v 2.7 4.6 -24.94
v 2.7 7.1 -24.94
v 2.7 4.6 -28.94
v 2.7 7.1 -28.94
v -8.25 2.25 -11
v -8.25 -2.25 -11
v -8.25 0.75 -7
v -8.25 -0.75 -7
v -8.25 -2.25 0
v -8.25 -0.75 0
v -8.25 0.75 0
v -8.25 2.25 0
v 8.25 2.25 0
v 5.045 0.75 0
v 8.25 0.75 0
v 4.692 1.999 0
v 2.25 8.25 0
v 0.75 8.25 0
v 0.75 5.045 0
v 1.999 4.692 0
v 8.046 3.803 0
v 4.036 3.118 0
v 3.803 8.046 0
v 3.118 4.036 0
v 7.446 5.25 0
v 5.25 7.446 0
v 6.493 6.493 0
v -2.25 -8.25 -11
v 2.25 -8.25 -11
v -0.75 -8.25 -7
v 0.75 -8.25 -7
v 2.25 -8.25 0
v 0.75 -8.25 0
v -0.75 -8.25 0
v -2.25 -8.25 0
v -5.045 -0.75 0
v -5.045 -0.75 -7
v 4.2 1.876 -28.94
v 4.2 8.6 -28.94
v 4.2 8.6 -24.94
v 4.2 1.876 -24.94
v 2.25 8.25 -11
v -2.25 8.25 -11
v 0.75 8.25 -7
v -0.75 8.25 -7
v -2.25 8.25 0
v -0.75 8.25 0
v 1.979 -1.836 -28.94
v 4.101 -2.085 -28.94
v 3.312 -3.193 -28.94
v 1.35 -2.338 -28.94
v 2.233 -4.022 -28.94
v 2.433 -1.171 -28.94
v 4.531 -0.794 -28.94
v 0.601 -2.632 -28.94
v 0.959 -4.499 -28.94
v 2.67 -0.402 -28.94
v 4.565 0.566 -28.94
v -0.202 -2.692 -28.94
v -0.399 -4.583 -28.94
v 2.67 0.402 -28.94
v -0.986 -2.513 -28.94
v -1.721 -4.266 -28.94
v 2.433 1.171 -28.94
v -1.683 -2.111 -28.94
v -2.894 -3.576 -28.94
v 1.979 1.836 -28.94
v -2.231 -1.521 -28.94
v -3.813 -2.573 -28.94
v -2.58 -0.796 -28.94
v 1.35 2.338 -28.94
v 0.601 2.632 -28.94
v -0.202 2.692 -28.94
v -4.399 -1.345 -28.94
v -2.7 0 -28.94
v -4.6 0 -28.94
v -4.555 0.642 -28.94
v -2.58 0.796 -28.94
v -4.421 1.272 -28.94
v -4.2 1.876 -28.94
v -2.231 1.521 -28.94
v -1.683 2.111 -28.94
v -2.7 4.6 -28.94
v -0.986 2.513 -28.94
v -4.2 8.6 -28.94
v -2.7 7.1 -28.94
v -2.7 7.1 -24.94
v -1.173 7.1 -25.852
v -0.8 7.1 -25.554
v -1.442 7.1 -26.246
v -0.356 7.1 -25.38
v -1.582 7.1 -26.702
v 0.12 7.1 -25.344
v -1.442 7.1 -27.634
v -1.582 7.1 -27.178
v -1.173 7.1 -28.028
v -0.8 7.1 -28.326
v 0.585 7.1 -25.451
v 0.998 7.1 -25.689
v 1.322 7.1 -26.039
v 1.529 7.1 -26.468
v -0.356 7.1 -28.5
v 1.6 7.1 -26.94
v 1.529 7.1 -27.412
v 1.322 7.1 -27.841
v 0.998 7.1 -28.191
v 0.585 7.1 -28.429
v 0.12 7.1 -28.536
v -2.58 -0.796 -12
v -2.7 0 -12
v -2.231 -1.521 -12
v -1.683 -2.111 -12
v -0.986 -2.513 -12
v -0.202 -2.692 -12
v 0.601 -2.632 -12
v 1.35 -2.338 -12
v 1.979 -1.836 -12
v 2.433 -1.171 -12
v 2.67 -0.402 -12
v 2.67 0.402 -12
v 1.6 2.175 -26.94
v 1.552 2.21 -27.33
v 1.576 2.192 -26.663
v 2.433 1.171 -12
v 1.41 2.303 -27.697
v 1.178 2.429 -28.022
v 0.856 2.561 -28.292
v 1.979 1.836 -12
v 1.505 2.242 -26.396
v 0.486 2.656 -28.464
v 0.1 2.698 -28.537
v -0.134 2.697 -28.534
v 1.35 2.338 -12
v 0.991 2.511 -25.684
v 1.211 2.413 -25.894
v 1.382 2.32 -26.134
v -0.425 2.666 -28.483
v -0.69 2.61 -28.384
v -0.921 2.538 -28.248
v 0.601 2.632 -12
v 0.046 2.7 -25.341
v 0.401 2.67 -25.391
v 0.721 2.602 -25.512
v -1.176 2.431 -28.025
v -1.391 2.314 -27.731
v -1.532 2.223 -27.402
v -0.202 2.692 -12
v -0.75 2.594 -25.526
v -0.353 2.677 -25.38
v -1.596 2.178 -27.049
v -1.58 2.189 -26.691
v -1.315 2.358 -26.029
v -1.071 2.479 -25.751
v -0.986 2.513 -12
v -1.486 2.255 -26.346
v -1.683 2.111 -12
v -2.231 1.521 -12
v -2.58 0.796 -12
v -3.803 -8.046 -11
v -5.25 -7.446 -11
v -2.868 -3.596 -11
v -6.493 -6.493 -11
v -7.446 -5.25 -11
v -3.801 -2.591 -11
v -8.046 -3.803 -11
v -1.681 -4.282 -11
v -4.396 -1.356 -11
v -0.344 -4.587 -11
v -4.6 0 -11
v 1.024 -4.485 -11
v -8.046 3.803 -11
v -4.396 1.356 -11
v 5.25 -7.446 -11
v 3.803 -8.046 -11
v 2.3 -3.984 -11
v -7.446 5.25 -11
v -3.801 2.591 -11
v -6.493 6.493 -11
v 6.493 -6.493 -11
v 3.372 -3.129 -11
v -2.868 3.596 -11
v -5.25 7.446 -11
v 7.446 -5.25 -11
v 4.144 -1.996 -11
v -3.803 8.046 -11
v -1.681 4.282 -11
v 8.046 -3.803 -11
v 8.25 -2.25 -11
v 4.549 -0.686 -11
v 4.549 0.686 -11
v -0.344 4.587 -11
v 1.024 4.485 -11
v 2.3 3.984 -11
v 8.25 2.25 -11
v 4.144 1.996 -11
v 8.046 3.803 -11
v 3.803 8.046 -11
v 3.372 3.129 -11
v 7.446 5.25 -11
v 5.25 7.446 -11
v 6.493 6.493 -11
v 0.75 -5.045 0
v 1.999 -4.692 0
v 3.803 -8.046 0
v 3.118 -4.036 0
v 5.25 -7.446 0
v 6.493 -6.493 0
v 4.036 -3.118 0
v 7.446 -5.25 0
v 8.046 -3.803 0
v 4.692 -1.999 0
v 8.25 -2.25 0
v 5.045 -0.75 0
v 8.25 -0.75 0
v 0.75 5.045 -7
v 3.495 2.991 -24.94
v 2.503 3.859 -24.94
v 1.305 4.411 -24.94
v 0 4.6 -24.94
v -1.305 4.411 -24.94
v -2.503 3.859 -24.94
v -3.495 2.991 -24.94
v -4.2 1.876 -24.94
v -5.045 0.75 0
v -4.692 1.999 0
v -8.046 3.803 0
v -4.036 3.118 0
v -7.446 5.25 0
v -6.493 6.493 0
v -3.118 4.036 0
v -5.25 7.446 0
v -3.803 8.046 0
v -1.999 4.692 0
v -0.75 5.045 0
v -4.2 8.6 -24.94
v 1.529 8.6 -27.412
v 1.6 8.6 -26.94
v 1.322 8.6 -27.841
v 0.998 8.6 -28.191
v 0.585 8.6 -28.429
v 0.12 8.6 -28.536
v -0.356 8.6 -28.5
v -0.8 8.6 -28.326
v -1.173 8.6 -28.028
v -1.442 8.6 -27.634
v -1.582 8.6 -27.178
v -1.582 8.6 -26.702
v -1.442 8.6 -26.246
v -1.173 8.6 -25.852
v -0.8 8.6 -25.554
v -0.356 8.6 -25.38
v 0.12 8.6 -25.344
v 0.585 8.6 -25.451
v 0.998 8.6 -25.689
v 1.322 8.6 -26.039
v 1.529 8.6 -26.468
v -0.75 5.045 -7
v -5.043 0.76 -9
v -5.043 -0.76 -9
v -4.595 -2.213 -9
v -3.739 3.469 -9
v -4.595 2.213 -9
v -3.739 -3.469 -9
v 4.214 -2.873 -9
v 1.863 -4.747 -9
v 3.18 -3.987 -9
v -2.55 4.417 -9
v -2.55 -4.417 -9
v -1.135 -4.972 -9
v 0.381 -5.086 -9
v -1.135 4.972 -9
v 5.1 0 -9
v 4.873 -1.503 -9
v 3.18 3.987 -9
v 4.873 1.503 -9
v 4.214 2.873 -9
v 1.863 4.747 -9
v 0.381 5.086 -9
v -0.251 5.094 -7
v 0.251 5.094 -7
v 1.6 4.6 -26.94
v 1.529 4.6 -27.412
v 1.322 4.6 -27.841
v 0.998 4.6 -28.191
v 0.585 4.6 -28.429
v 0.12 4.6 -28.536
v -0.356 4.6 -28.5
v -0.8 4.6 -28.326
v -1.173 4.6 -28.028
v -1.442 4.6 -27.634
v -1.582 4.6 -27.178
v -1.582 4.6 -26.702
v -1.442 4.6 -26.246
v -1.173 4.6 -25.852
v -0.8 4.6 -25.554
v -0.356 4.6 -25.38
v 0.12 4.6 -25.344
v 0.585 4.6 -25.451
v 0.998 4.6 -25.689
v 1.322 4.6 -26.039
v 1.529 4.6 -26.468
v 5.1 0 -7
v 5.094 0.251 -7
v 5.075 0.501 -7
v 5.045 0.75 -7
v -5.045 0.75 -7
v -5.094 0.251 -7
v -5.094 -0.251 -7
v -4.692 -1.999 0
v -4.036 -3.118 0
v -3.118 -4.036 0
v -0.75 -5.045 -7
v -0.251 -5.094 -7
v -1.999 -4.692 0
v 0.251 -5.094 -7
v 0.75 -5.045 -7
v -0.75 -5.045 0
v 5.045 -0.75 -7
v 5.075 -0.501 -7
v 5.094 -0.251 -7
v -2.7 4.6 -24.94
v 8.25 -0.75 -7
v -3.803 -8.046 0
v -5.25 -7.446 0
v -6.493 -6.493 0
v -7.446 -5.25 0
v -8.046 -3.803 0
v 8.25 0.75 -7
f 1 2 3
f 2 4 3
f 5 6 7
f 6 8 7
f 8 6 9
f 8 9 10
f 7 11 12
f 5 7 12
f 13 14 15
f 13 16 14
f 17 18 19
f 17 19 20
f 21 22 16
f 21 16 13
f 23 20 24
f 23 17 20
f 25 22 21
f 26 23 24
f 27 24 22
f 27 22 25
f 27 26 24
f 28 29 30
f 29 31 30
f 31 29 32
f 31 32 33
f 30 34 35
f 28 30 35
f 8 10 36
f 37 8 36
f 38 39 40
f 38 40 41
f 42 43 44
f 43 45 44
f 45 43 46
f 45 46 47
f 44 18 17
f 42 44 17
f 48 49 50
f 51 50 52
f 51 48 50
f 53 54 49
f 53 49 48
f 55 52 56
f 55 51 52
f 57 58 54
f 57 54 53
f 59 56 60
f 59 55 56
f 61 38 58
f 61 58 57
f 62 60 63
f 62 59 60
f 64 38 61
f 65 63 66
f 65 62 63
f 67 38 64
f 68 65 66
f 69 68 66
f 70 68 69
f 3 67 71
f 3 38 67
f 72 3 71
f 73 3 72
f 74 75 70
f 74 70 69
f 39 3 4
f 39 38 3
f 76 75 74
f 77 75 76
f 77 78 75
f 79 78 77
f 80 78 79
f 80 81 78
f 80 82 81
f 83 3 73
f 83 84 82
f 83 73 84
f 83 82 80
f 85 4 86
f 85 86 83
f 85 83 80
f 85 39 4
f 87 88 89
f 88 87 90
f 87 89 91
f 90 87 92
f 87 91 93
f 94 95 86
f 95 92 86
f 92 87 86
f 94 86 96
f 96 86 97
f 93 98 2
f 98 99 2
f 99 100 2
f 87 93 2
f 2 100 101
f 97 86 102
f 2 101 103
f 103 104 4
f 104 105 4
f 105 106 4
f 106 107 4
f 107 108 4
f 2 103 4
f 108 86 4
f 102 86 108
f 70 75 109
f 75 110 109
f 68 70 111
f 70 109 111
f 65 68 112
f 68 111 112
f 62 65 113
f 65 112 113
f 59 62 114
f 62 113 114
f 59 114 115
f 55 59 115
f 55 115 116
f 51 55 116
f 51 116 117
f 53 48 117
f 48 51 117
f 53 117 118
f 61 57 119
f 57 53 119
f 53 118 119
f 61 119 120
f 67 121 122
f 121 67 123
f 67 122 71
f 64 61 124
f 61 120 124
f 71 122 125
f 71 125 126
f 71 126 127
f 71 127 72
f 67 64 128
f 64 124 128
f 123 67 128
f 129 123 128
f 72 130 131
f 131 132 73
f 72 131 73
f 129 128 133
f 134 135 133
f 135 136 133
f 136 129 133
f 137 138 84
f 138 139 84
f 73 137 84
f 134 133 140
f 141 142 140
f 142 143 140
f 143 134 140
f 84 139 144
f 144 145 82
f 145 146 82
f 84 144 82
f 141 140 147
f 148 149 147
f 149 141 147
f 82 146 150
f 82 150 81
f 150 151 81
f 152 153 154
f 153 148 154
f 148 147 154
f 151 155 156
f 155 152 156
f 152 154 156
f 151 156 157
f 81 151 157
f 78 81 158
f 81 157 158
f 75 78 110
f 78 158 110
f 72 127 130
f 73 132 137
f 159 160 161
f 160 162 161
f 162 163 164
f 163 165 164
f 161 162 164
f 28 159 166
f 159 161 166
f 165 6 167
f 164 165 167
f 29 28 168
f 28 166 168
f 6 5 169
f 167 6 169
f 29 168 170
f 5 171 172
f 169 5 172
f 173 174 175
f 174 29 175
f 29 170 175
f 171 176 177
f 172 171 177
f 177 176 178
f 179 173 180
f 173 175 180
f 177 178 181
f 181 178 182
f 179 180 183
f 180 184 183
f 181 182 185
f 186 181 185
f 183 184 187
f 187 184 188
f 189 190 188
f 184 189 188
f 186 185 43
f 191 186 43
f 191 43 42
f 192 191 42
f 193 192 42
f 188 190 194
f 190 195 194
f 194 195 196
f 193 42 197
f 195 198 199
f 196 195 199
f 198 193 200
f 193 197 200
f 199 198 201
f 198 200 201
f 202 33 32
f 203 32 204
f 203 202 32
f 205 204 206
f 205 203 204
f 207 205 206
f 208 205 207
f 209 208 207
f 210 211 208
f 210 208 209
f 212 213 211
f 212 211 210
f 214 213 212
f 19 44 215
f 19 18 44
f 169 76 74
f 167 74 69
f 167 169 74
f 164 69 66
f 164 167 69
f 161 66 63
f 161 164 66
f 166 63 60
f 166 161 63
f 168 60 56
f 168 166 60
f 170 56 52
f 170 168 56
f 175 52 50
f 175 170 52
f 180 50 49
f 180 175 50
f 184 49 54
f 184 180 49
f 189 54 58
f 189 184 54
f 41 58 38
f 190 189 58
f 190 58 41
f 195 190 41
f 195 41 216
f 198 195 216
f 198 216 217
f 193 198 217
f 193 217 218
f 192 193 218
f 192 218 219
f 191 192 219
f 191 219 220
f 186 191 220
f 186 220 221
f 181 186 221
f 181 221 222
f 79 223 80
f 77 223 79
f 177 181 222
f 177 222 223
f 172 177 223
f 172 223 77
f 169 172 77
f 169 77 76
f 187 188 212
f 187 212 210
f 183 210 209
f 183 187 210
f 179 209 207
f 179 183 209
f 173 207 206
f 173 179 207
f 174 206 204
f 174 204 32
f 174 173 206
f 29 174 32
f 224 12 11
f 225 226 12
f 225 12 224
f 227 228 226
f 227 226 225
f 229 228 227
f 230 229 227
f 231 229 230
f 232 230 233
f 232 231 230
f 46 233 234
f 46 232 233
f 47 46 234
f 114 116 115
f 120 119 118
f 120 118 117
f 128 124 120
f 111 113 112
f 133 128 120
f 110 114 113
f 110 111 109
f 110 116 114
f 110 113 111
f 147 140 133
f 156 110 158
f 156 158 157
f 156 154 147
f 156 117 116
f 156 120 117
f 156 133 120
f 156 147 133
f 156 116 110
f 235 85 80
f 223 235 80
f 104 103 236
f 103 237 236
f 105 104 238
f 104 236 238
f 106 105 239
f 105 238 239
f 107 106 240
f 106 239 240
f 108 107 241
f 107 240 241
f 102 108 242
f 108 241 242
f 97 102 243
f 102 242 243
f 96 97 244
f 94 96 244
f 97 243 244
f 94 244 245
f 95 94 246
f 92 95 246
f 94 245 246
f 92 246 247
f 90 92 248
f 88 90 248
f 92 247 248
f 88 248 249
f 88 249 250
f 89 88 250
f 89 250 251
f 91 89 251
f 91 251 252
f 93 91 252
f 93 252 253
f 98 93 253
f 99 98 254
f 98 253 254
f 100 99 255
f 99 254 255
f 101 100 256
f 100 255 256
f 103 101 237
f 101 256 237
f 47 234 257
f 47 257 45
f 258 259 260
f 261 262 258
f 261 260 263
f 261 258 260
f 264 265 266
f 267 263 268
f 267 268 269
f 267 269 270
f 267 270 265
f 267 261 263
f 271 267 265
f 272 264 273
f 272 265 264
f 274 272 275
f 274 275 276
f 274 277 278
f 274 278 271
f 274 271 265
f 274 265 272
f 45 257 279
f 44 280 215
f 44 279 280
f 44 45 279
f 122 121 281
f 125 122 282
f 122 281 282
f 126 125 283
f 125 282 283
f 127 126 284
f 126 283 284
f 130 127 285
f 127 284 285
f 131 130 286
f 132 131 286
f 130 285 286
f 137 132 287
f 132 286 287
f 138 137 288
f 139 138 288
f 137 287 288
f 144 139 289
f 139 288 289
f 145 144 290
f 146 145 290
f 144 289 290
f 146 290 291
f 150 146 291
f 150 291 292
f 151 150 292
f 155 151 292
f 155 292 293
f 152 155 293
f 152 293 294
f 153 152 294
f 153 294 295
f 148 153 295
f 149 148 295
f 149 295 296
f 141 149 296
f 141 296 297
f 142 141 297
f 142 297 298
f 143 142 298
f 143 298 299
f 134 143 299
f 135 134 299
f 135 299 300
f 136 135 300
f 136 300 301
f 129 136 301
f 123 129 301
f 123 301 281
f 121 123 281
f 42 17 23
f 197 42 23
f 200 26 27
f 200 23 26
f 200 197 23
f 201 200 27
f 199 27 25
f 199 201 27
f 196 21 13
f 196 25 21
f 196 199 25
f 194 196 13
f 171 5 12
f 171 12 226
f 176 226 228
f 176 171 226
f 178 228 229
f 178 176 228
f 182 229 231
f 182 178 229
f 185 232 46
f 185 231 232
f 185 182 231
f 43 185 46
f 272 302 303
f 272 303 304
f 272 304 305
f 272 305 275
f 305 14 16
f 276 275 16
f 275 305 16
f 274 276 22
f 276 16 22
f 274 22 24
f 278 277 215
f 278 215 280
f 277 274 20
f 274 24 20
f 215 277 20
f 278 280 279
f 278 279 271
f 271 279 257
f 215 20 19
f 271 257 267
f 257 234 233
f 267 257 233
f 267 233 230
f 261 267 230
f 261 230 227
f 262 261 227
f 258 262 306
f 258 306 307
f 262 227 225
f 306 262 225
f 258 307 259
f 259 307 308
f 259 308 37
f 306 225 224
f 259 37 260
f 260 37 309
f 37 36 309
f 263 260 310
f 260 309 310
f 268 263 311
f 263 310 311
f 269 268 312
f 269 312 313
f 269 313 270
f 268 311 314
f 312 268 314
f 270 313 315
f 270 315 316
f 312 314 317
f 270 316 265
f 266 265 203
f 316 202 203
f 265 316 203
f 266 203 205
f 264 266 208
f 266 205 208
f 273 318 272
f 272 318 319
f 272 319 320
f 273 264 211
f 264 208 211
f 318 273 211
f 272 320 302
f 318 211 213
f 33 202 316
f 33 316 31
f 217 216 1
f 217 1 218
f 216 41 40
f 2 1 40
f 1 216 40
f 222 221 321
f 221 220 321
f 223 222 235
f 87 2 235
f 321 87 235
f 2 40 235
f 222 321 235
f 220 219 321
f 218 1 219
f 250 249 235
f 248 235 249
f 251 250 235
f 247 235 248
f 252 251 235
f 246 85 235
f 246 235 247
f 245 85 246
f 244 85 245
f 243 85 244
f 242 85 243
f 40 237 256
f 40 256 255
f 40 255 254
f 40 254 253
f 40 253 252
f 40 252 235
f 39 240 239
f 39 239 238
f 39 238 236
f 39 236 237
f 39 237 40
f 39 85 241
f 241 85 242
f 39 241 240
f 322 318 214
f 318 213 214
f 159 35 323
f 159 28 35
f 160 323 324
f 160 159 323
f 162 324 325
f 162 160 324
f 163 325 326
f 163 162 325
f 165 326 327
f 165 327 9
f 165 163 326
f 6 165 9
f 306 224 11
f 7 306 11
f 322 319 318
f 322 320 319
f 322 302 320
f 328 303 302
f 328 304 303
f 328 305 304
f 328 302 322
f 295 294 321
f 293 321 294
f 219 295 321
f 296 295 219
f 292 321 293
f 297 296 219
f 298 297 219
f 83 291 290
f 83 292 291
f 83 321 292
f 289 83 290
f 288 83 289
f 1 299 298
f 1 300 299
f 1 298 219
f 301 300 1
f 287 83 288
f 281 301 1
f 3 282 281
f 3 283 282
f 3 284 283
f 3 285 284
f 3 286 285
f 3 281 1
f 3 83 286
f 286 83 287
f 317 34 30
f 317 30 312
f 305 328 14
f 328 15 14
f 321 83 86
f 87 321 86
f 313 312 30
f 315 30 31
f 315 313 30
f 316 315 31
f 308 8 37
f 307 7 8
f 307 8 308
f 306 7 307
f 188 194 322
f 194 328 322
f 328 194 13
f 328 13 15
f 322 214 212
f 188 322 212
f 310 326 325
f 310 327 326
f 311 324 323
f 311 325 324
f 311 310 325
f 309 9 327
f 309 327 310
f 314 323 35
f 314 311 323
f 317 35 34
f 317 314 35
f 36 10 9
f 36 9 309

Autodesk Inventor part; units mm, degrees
ref_plane "YZ Plane" through (0, 0, 0) normal (1, 0, 0) x (0, 1, 0)
ref_plane "XY Plane" through (0, 0, 0) normal (0, 0, 1) x (1, 0, 0)
sketch "Sketch1" plane through (0, 0, 0) normal (0, 0, 1) x (1, 0, 0)
  circle A0 centre (0, 0) radius 5.1
  line L0 (-8.25, 8.25) -> (8.25, 8.25)
  line L1 (8.25, 8.25) -> (8.25, -8.25)
  line L2 (8.25, -8.25) -> (-8.25, -8.25)
  line L3 (-8.25, -8.25) -> (-8.25, 8.25)
  line L4 (-8.25, 8.25) -> (8.25, -8.25) construction
  line L5 (8.25, 8.25) -> (-8.25, -8.25) construction
  line L6 (0.75, -8.25) -> (-0.75, -8.25)
  line L7 (-0.75, -8.25) -> (-0.75, 8.25)
  line L8 (-0.75, 8.25) -> (0.75, 8.25)
  line L9 (0.75, 8.25) -> (0.75, -8.25)
  line L10 (0.75, -8.25) -> (-0.75, 8.25) construction
  line L11 (-0.75, -8.25) -> (0.75, 8.25) construction
  line L12 (8.25, 0.75) -> (-8.25, 0.75)
  line L13 (-8.25, 0.75) -> (-8.25, -0.75)
  line L14 (-8.25, -0.75) -> (8.25, -0.75)
  line L15 (8.25, -0.75) -> (8.25, 0.75)
  line L16 (8.25, 0.75) -> (-8.25, -0.75) construction
  line L17 (-8.25, 0.75) -> (8.25, -0.75) construction
  point P0 (0.75, -5.0446)
  point P1 (5.0446, -0.75)
  point P2 (5.0446, 0.75)
  point P3 (0.75, 5.0446)
  point P4 (-0.75, 5.0446)
  point P5 (-5.0446, 0.75)
  point P6 (-5.0446, -0.75)
  point P7 (-0.75, -5.0446)
  dimension "d0" = 10.2
  dimension "d1" = 16.5
  dimension "d2" = 1.5
  dimension "d3" = 1.5
  dimension "d38" = 16.5
extrude "Extrusion1" add sketch "Sketch1" against normal blind 11
extrude "Extrusion2" cut sketch "Sketch1" against normal blind 7 contours A0 L14 L9 L12 | A0 L12 L1 L14 | L12 L9 A0 | A0 L9 L14 | L9 L12 L7 A0 | A0 L7 L0 L9 | L9 L14 L7 L12 | L9 L2 L7 A0 | A0 L7 L14 L9 | L7 L12 A0 | L7 L14 A0 L12 | A0 L14 L7 | A0 L14 L3 L12
sketch "Sketch2" plane through (0, 0, -11) normal (0, 0, -1) x (-1, 0, 0)
  circle A0 centre (0, 0) radius 5
  dimension "d8" = 10
extrude "Extrusion3" [suppressed]
fillet "Fillet1" radius 6 4 edges at (8.25, 8.25, -5.5) (8.25, -8.25, -5.5) (-8.25, -8.25, -5.5) (-8.25, 8.25, -5.5)
sketch "Sketch3" plane through (0, 0, -26) normal (0, 0, -1) x (-1, 0, 0)
  line L0 (4, 2.7238) -> (10.2, 2.7238)
  line L1 (10.2, 2.7238) -> (10.2, -2.0551)
  line L2 (10.2, -2.0551) -> (4, -2.0551)
  line L3 (4, -2.0551) -> (4, 2.7238)
  arc A0 (2.5948, 0.1645) -> (2.1, -1.533) centre (0, 0) ccw
  circle A1 centre (0, 0) radius 5 projected
  line L4 (0, 5) -> (10.2, 5)
  line L5 (10.2, 5) -> (10.2, -5)
  line L6 (10.2, -5) -> (0, -5)
  arc A2 (8.25, 2.25) -> (2.25, 8.25) centre (2.25, 2.25) ccw projected
  line L7 (2.25, 8.25) -> (-2.25, 8.25) projected
  arc A3 (-2.25, 8.25) -> (-8.25, 2.25) centre (-2.25, 2.25) ccw projected
  line L8 (-8.25, 2.25) -> (-8.25, -2.25) projected
  arc A4 (-8.25, -2.25) -> (-2.25, -8.25) centre (-2.25, -2.25) ccw projected
  line L9 (-2.25, -8.25) -> (2.25, -8.25) projected
  arc A5 (2.25, -8.25) -> (8.25, -2.25) centre (2.25, -2.25) ccw projected
  line L10 (8.25, -2.25) -> (8.25, 2.25) projected
  line L11 (-2.6, -2.9034) -> (-2.6, 2.8378)
  circle A6 centre (0, 0) radius 2.6
  point P0 (0.75, 5.0446)
  point P1 (2.1, -1.533)
  point P2 (2.5948, 0.1645)
  dimension "d12" = 6.2
  dimension "d13" = 4
  dimension "d14" = 5.2
extrude "Extrusion4" [suppressed]
sketch "Sketch4" plane through (-10.2, -5, -26) normal (-1, 0, 0) x (0, 0, 1)
  circle A0 centre (4, 5) radius 1.7
  line L0 (0, 0) -> (0, 10) projected
  point P0 (26, 5)
  point P1 (0, 5)
  point P2 (0, 5)
  dimension "d17" = 3.4
  dimension "d18" = 4
extrude "Extrusion5" [suppressed]
extrude "Extrusion6" [suppressed]
fillet "Fillet2" [suppressed]
fillet "Fillet3" [suppressed]
sketch "Sketch5" plane through (0, 0, -11) normal (0, 0, -1) x (-1, 0, 0)
  arc A0 (8.25, 2.25) -> (2.25, 8.25) centre (2.25, 2.25) ccw projected
  line L0 (2.25, 8.25) -> (-2.25, 8.25) projected
  arc A1 (-2.25, 8.25) -> (-8.25, 2.25) centre (-2.25, 2.25) ccw projected
  line L1 (-8.25, 2.25) -> (-8.25, -2.25) projected
  arc A2 (-8.25, -2.25) -> (-2.25, -8.25) centre (-2.25, -2.25) ccw projected
  line L2 (-2.25, -8.25) -> (2.25, -8.25) projected
  arc A3 (2.25, -8.25) -> (8.25, -2.25) centre (2.25, -2.25) ccw projected
  line L3 (8.25, -2.25) -> (8.25, 2.25) projected
  line L4 (-5.5, 5.5) -> (5.5, 5.5)
  line L5 (5.5, 5.5) -> (5.5, -5.5)
  line L6 (5.5, -5.5) -> (-5.5, -5.5)
  line L7 (-5.5, -5.5) -> (-5.5, 5.5)
  line L8 (-5.5, 5.5) -> (5.5, -5.5) construction
  line L9 (5.5, 5.5) -> (-5.5, -5.5) construction
  point P0 (0, 0)
  dimension "d31" = 11
  dimension "d32" = 11
extrude "Extrusion7" [suppressed]
sketch "Sketch6" plane through (0, 0, -7) normal (0, 0, 1) x (1, 0, 0)
  circle A0 centre (0, 0) radius 5.1
extrude "Extrusion8" cut sketch "Sketch6" against normal blind 2
sketch "Sketch7" plane through (0, 0, -11) normal (0, 0, -1) x (-1, 0, 0)
  circle A0 centre (0, 0) radius 4.6
  circle A1 centre (0, 0) radius 2.7
  dimension "d35" = 9.2
  dimension "d39" = 5.4
extrude "Extrusion9" add sketch "Sketch7" along normal blind 17.94
ref_plane "Work Plane1" through (0, 4.6, -11) normal (0, 1, 0) x (-1, 0, 0)
sketch "Sketch8" plane through (0, 4.6, -11) normal (0, 1, 0) x (-1, 0, 0)
  line L0 (2.7, -17.94) -> (-2.7, -17.94)
  line L1 (-2.7, -17.94) -> (-2.7, -14.94)
  line L2 (-2.7, -14.94) -> (2.7, -14.94)
  line L3 (2.7, -14.94) -> (2.7, -17.94)
  line L4 (-4.6, -17.94) -> (4.6, -17.94) projected
  point P0 (0, 11)
  point P1 (0, -17.94)
  dimension "d40" = 5.4
  dimension "d41" = 3
sketch "Sketch9" plane through (0, 0, -28.94) normal (0, 0, -1) x (-1, 0, 0)
  line L0 (2.7, 4.6) -> (-2.7, 4.6) projected
  line L1 (-2.7, 4.6) -> (2.7, 4.6)
  line L2 (2.7, 4.6) -> (2.7, 7.1)
  line L3 (2.7, 7.1) -> (-2.7, 7.1)
  line L4 (-2.7, 7.1) -> (-2.7, 4.6)
  line L5 (-4.2, 4.6) -> (4.2, 4.6)
  line L6 (4.2, 4.6) -> (4.2, 8.6)
  line L7 (4.2, 8.6) -> (-4.2, 8.6)
  line L8 (-4.2, 8.6) -> (-4.2, 4.6)
  line L9 (-4.2, 4.6) -> (-4.2, 1.8762)
  circle A0 centre (0, 0) radius 4.6 projected
  line L10 (4.2, 4.6) -> (4.2, 1.8762)
  point P0 (0, 4.6)
  dimension "d42" = 5.4
  dimension "d43" = 2.5
  dimension "d44" = 1.5
  dimension "d45" = 1.5
  dimension "d46" = 1.5
extrude "Extrusion10" add sketch "Sketch9" against normal blind 4 contours L5 L10 A0 L0 | L2 L3 L4 L5 L8 L7 L6 | A0 L9 L5 L0
sketch "Sketch10" plane through (-4.2, 8.6, -28.94) normal (0, 1, 0) x (1, 0, 0)
  line L0 (4.2, -4) -> (4.2, 0) projected
  circle A0 centre (4.2, -2) radius 1.6
  point P0 (4.2, -28.94)
  dimension "d49" = 3.2
extrude "Extrusion11" cut sketch "Sketch10" against normal blind 9.25
sketch "Sketch11" plane through (0, 0, -11) normal (0, 0, -1) x (-1, 0, 0)
  circle A0 centre (0, 0) radius 2.7 projected
extrude "Extrusion12" add sketch "Sketch11" along normal blind 1
properties part number "rubik_adapter"
